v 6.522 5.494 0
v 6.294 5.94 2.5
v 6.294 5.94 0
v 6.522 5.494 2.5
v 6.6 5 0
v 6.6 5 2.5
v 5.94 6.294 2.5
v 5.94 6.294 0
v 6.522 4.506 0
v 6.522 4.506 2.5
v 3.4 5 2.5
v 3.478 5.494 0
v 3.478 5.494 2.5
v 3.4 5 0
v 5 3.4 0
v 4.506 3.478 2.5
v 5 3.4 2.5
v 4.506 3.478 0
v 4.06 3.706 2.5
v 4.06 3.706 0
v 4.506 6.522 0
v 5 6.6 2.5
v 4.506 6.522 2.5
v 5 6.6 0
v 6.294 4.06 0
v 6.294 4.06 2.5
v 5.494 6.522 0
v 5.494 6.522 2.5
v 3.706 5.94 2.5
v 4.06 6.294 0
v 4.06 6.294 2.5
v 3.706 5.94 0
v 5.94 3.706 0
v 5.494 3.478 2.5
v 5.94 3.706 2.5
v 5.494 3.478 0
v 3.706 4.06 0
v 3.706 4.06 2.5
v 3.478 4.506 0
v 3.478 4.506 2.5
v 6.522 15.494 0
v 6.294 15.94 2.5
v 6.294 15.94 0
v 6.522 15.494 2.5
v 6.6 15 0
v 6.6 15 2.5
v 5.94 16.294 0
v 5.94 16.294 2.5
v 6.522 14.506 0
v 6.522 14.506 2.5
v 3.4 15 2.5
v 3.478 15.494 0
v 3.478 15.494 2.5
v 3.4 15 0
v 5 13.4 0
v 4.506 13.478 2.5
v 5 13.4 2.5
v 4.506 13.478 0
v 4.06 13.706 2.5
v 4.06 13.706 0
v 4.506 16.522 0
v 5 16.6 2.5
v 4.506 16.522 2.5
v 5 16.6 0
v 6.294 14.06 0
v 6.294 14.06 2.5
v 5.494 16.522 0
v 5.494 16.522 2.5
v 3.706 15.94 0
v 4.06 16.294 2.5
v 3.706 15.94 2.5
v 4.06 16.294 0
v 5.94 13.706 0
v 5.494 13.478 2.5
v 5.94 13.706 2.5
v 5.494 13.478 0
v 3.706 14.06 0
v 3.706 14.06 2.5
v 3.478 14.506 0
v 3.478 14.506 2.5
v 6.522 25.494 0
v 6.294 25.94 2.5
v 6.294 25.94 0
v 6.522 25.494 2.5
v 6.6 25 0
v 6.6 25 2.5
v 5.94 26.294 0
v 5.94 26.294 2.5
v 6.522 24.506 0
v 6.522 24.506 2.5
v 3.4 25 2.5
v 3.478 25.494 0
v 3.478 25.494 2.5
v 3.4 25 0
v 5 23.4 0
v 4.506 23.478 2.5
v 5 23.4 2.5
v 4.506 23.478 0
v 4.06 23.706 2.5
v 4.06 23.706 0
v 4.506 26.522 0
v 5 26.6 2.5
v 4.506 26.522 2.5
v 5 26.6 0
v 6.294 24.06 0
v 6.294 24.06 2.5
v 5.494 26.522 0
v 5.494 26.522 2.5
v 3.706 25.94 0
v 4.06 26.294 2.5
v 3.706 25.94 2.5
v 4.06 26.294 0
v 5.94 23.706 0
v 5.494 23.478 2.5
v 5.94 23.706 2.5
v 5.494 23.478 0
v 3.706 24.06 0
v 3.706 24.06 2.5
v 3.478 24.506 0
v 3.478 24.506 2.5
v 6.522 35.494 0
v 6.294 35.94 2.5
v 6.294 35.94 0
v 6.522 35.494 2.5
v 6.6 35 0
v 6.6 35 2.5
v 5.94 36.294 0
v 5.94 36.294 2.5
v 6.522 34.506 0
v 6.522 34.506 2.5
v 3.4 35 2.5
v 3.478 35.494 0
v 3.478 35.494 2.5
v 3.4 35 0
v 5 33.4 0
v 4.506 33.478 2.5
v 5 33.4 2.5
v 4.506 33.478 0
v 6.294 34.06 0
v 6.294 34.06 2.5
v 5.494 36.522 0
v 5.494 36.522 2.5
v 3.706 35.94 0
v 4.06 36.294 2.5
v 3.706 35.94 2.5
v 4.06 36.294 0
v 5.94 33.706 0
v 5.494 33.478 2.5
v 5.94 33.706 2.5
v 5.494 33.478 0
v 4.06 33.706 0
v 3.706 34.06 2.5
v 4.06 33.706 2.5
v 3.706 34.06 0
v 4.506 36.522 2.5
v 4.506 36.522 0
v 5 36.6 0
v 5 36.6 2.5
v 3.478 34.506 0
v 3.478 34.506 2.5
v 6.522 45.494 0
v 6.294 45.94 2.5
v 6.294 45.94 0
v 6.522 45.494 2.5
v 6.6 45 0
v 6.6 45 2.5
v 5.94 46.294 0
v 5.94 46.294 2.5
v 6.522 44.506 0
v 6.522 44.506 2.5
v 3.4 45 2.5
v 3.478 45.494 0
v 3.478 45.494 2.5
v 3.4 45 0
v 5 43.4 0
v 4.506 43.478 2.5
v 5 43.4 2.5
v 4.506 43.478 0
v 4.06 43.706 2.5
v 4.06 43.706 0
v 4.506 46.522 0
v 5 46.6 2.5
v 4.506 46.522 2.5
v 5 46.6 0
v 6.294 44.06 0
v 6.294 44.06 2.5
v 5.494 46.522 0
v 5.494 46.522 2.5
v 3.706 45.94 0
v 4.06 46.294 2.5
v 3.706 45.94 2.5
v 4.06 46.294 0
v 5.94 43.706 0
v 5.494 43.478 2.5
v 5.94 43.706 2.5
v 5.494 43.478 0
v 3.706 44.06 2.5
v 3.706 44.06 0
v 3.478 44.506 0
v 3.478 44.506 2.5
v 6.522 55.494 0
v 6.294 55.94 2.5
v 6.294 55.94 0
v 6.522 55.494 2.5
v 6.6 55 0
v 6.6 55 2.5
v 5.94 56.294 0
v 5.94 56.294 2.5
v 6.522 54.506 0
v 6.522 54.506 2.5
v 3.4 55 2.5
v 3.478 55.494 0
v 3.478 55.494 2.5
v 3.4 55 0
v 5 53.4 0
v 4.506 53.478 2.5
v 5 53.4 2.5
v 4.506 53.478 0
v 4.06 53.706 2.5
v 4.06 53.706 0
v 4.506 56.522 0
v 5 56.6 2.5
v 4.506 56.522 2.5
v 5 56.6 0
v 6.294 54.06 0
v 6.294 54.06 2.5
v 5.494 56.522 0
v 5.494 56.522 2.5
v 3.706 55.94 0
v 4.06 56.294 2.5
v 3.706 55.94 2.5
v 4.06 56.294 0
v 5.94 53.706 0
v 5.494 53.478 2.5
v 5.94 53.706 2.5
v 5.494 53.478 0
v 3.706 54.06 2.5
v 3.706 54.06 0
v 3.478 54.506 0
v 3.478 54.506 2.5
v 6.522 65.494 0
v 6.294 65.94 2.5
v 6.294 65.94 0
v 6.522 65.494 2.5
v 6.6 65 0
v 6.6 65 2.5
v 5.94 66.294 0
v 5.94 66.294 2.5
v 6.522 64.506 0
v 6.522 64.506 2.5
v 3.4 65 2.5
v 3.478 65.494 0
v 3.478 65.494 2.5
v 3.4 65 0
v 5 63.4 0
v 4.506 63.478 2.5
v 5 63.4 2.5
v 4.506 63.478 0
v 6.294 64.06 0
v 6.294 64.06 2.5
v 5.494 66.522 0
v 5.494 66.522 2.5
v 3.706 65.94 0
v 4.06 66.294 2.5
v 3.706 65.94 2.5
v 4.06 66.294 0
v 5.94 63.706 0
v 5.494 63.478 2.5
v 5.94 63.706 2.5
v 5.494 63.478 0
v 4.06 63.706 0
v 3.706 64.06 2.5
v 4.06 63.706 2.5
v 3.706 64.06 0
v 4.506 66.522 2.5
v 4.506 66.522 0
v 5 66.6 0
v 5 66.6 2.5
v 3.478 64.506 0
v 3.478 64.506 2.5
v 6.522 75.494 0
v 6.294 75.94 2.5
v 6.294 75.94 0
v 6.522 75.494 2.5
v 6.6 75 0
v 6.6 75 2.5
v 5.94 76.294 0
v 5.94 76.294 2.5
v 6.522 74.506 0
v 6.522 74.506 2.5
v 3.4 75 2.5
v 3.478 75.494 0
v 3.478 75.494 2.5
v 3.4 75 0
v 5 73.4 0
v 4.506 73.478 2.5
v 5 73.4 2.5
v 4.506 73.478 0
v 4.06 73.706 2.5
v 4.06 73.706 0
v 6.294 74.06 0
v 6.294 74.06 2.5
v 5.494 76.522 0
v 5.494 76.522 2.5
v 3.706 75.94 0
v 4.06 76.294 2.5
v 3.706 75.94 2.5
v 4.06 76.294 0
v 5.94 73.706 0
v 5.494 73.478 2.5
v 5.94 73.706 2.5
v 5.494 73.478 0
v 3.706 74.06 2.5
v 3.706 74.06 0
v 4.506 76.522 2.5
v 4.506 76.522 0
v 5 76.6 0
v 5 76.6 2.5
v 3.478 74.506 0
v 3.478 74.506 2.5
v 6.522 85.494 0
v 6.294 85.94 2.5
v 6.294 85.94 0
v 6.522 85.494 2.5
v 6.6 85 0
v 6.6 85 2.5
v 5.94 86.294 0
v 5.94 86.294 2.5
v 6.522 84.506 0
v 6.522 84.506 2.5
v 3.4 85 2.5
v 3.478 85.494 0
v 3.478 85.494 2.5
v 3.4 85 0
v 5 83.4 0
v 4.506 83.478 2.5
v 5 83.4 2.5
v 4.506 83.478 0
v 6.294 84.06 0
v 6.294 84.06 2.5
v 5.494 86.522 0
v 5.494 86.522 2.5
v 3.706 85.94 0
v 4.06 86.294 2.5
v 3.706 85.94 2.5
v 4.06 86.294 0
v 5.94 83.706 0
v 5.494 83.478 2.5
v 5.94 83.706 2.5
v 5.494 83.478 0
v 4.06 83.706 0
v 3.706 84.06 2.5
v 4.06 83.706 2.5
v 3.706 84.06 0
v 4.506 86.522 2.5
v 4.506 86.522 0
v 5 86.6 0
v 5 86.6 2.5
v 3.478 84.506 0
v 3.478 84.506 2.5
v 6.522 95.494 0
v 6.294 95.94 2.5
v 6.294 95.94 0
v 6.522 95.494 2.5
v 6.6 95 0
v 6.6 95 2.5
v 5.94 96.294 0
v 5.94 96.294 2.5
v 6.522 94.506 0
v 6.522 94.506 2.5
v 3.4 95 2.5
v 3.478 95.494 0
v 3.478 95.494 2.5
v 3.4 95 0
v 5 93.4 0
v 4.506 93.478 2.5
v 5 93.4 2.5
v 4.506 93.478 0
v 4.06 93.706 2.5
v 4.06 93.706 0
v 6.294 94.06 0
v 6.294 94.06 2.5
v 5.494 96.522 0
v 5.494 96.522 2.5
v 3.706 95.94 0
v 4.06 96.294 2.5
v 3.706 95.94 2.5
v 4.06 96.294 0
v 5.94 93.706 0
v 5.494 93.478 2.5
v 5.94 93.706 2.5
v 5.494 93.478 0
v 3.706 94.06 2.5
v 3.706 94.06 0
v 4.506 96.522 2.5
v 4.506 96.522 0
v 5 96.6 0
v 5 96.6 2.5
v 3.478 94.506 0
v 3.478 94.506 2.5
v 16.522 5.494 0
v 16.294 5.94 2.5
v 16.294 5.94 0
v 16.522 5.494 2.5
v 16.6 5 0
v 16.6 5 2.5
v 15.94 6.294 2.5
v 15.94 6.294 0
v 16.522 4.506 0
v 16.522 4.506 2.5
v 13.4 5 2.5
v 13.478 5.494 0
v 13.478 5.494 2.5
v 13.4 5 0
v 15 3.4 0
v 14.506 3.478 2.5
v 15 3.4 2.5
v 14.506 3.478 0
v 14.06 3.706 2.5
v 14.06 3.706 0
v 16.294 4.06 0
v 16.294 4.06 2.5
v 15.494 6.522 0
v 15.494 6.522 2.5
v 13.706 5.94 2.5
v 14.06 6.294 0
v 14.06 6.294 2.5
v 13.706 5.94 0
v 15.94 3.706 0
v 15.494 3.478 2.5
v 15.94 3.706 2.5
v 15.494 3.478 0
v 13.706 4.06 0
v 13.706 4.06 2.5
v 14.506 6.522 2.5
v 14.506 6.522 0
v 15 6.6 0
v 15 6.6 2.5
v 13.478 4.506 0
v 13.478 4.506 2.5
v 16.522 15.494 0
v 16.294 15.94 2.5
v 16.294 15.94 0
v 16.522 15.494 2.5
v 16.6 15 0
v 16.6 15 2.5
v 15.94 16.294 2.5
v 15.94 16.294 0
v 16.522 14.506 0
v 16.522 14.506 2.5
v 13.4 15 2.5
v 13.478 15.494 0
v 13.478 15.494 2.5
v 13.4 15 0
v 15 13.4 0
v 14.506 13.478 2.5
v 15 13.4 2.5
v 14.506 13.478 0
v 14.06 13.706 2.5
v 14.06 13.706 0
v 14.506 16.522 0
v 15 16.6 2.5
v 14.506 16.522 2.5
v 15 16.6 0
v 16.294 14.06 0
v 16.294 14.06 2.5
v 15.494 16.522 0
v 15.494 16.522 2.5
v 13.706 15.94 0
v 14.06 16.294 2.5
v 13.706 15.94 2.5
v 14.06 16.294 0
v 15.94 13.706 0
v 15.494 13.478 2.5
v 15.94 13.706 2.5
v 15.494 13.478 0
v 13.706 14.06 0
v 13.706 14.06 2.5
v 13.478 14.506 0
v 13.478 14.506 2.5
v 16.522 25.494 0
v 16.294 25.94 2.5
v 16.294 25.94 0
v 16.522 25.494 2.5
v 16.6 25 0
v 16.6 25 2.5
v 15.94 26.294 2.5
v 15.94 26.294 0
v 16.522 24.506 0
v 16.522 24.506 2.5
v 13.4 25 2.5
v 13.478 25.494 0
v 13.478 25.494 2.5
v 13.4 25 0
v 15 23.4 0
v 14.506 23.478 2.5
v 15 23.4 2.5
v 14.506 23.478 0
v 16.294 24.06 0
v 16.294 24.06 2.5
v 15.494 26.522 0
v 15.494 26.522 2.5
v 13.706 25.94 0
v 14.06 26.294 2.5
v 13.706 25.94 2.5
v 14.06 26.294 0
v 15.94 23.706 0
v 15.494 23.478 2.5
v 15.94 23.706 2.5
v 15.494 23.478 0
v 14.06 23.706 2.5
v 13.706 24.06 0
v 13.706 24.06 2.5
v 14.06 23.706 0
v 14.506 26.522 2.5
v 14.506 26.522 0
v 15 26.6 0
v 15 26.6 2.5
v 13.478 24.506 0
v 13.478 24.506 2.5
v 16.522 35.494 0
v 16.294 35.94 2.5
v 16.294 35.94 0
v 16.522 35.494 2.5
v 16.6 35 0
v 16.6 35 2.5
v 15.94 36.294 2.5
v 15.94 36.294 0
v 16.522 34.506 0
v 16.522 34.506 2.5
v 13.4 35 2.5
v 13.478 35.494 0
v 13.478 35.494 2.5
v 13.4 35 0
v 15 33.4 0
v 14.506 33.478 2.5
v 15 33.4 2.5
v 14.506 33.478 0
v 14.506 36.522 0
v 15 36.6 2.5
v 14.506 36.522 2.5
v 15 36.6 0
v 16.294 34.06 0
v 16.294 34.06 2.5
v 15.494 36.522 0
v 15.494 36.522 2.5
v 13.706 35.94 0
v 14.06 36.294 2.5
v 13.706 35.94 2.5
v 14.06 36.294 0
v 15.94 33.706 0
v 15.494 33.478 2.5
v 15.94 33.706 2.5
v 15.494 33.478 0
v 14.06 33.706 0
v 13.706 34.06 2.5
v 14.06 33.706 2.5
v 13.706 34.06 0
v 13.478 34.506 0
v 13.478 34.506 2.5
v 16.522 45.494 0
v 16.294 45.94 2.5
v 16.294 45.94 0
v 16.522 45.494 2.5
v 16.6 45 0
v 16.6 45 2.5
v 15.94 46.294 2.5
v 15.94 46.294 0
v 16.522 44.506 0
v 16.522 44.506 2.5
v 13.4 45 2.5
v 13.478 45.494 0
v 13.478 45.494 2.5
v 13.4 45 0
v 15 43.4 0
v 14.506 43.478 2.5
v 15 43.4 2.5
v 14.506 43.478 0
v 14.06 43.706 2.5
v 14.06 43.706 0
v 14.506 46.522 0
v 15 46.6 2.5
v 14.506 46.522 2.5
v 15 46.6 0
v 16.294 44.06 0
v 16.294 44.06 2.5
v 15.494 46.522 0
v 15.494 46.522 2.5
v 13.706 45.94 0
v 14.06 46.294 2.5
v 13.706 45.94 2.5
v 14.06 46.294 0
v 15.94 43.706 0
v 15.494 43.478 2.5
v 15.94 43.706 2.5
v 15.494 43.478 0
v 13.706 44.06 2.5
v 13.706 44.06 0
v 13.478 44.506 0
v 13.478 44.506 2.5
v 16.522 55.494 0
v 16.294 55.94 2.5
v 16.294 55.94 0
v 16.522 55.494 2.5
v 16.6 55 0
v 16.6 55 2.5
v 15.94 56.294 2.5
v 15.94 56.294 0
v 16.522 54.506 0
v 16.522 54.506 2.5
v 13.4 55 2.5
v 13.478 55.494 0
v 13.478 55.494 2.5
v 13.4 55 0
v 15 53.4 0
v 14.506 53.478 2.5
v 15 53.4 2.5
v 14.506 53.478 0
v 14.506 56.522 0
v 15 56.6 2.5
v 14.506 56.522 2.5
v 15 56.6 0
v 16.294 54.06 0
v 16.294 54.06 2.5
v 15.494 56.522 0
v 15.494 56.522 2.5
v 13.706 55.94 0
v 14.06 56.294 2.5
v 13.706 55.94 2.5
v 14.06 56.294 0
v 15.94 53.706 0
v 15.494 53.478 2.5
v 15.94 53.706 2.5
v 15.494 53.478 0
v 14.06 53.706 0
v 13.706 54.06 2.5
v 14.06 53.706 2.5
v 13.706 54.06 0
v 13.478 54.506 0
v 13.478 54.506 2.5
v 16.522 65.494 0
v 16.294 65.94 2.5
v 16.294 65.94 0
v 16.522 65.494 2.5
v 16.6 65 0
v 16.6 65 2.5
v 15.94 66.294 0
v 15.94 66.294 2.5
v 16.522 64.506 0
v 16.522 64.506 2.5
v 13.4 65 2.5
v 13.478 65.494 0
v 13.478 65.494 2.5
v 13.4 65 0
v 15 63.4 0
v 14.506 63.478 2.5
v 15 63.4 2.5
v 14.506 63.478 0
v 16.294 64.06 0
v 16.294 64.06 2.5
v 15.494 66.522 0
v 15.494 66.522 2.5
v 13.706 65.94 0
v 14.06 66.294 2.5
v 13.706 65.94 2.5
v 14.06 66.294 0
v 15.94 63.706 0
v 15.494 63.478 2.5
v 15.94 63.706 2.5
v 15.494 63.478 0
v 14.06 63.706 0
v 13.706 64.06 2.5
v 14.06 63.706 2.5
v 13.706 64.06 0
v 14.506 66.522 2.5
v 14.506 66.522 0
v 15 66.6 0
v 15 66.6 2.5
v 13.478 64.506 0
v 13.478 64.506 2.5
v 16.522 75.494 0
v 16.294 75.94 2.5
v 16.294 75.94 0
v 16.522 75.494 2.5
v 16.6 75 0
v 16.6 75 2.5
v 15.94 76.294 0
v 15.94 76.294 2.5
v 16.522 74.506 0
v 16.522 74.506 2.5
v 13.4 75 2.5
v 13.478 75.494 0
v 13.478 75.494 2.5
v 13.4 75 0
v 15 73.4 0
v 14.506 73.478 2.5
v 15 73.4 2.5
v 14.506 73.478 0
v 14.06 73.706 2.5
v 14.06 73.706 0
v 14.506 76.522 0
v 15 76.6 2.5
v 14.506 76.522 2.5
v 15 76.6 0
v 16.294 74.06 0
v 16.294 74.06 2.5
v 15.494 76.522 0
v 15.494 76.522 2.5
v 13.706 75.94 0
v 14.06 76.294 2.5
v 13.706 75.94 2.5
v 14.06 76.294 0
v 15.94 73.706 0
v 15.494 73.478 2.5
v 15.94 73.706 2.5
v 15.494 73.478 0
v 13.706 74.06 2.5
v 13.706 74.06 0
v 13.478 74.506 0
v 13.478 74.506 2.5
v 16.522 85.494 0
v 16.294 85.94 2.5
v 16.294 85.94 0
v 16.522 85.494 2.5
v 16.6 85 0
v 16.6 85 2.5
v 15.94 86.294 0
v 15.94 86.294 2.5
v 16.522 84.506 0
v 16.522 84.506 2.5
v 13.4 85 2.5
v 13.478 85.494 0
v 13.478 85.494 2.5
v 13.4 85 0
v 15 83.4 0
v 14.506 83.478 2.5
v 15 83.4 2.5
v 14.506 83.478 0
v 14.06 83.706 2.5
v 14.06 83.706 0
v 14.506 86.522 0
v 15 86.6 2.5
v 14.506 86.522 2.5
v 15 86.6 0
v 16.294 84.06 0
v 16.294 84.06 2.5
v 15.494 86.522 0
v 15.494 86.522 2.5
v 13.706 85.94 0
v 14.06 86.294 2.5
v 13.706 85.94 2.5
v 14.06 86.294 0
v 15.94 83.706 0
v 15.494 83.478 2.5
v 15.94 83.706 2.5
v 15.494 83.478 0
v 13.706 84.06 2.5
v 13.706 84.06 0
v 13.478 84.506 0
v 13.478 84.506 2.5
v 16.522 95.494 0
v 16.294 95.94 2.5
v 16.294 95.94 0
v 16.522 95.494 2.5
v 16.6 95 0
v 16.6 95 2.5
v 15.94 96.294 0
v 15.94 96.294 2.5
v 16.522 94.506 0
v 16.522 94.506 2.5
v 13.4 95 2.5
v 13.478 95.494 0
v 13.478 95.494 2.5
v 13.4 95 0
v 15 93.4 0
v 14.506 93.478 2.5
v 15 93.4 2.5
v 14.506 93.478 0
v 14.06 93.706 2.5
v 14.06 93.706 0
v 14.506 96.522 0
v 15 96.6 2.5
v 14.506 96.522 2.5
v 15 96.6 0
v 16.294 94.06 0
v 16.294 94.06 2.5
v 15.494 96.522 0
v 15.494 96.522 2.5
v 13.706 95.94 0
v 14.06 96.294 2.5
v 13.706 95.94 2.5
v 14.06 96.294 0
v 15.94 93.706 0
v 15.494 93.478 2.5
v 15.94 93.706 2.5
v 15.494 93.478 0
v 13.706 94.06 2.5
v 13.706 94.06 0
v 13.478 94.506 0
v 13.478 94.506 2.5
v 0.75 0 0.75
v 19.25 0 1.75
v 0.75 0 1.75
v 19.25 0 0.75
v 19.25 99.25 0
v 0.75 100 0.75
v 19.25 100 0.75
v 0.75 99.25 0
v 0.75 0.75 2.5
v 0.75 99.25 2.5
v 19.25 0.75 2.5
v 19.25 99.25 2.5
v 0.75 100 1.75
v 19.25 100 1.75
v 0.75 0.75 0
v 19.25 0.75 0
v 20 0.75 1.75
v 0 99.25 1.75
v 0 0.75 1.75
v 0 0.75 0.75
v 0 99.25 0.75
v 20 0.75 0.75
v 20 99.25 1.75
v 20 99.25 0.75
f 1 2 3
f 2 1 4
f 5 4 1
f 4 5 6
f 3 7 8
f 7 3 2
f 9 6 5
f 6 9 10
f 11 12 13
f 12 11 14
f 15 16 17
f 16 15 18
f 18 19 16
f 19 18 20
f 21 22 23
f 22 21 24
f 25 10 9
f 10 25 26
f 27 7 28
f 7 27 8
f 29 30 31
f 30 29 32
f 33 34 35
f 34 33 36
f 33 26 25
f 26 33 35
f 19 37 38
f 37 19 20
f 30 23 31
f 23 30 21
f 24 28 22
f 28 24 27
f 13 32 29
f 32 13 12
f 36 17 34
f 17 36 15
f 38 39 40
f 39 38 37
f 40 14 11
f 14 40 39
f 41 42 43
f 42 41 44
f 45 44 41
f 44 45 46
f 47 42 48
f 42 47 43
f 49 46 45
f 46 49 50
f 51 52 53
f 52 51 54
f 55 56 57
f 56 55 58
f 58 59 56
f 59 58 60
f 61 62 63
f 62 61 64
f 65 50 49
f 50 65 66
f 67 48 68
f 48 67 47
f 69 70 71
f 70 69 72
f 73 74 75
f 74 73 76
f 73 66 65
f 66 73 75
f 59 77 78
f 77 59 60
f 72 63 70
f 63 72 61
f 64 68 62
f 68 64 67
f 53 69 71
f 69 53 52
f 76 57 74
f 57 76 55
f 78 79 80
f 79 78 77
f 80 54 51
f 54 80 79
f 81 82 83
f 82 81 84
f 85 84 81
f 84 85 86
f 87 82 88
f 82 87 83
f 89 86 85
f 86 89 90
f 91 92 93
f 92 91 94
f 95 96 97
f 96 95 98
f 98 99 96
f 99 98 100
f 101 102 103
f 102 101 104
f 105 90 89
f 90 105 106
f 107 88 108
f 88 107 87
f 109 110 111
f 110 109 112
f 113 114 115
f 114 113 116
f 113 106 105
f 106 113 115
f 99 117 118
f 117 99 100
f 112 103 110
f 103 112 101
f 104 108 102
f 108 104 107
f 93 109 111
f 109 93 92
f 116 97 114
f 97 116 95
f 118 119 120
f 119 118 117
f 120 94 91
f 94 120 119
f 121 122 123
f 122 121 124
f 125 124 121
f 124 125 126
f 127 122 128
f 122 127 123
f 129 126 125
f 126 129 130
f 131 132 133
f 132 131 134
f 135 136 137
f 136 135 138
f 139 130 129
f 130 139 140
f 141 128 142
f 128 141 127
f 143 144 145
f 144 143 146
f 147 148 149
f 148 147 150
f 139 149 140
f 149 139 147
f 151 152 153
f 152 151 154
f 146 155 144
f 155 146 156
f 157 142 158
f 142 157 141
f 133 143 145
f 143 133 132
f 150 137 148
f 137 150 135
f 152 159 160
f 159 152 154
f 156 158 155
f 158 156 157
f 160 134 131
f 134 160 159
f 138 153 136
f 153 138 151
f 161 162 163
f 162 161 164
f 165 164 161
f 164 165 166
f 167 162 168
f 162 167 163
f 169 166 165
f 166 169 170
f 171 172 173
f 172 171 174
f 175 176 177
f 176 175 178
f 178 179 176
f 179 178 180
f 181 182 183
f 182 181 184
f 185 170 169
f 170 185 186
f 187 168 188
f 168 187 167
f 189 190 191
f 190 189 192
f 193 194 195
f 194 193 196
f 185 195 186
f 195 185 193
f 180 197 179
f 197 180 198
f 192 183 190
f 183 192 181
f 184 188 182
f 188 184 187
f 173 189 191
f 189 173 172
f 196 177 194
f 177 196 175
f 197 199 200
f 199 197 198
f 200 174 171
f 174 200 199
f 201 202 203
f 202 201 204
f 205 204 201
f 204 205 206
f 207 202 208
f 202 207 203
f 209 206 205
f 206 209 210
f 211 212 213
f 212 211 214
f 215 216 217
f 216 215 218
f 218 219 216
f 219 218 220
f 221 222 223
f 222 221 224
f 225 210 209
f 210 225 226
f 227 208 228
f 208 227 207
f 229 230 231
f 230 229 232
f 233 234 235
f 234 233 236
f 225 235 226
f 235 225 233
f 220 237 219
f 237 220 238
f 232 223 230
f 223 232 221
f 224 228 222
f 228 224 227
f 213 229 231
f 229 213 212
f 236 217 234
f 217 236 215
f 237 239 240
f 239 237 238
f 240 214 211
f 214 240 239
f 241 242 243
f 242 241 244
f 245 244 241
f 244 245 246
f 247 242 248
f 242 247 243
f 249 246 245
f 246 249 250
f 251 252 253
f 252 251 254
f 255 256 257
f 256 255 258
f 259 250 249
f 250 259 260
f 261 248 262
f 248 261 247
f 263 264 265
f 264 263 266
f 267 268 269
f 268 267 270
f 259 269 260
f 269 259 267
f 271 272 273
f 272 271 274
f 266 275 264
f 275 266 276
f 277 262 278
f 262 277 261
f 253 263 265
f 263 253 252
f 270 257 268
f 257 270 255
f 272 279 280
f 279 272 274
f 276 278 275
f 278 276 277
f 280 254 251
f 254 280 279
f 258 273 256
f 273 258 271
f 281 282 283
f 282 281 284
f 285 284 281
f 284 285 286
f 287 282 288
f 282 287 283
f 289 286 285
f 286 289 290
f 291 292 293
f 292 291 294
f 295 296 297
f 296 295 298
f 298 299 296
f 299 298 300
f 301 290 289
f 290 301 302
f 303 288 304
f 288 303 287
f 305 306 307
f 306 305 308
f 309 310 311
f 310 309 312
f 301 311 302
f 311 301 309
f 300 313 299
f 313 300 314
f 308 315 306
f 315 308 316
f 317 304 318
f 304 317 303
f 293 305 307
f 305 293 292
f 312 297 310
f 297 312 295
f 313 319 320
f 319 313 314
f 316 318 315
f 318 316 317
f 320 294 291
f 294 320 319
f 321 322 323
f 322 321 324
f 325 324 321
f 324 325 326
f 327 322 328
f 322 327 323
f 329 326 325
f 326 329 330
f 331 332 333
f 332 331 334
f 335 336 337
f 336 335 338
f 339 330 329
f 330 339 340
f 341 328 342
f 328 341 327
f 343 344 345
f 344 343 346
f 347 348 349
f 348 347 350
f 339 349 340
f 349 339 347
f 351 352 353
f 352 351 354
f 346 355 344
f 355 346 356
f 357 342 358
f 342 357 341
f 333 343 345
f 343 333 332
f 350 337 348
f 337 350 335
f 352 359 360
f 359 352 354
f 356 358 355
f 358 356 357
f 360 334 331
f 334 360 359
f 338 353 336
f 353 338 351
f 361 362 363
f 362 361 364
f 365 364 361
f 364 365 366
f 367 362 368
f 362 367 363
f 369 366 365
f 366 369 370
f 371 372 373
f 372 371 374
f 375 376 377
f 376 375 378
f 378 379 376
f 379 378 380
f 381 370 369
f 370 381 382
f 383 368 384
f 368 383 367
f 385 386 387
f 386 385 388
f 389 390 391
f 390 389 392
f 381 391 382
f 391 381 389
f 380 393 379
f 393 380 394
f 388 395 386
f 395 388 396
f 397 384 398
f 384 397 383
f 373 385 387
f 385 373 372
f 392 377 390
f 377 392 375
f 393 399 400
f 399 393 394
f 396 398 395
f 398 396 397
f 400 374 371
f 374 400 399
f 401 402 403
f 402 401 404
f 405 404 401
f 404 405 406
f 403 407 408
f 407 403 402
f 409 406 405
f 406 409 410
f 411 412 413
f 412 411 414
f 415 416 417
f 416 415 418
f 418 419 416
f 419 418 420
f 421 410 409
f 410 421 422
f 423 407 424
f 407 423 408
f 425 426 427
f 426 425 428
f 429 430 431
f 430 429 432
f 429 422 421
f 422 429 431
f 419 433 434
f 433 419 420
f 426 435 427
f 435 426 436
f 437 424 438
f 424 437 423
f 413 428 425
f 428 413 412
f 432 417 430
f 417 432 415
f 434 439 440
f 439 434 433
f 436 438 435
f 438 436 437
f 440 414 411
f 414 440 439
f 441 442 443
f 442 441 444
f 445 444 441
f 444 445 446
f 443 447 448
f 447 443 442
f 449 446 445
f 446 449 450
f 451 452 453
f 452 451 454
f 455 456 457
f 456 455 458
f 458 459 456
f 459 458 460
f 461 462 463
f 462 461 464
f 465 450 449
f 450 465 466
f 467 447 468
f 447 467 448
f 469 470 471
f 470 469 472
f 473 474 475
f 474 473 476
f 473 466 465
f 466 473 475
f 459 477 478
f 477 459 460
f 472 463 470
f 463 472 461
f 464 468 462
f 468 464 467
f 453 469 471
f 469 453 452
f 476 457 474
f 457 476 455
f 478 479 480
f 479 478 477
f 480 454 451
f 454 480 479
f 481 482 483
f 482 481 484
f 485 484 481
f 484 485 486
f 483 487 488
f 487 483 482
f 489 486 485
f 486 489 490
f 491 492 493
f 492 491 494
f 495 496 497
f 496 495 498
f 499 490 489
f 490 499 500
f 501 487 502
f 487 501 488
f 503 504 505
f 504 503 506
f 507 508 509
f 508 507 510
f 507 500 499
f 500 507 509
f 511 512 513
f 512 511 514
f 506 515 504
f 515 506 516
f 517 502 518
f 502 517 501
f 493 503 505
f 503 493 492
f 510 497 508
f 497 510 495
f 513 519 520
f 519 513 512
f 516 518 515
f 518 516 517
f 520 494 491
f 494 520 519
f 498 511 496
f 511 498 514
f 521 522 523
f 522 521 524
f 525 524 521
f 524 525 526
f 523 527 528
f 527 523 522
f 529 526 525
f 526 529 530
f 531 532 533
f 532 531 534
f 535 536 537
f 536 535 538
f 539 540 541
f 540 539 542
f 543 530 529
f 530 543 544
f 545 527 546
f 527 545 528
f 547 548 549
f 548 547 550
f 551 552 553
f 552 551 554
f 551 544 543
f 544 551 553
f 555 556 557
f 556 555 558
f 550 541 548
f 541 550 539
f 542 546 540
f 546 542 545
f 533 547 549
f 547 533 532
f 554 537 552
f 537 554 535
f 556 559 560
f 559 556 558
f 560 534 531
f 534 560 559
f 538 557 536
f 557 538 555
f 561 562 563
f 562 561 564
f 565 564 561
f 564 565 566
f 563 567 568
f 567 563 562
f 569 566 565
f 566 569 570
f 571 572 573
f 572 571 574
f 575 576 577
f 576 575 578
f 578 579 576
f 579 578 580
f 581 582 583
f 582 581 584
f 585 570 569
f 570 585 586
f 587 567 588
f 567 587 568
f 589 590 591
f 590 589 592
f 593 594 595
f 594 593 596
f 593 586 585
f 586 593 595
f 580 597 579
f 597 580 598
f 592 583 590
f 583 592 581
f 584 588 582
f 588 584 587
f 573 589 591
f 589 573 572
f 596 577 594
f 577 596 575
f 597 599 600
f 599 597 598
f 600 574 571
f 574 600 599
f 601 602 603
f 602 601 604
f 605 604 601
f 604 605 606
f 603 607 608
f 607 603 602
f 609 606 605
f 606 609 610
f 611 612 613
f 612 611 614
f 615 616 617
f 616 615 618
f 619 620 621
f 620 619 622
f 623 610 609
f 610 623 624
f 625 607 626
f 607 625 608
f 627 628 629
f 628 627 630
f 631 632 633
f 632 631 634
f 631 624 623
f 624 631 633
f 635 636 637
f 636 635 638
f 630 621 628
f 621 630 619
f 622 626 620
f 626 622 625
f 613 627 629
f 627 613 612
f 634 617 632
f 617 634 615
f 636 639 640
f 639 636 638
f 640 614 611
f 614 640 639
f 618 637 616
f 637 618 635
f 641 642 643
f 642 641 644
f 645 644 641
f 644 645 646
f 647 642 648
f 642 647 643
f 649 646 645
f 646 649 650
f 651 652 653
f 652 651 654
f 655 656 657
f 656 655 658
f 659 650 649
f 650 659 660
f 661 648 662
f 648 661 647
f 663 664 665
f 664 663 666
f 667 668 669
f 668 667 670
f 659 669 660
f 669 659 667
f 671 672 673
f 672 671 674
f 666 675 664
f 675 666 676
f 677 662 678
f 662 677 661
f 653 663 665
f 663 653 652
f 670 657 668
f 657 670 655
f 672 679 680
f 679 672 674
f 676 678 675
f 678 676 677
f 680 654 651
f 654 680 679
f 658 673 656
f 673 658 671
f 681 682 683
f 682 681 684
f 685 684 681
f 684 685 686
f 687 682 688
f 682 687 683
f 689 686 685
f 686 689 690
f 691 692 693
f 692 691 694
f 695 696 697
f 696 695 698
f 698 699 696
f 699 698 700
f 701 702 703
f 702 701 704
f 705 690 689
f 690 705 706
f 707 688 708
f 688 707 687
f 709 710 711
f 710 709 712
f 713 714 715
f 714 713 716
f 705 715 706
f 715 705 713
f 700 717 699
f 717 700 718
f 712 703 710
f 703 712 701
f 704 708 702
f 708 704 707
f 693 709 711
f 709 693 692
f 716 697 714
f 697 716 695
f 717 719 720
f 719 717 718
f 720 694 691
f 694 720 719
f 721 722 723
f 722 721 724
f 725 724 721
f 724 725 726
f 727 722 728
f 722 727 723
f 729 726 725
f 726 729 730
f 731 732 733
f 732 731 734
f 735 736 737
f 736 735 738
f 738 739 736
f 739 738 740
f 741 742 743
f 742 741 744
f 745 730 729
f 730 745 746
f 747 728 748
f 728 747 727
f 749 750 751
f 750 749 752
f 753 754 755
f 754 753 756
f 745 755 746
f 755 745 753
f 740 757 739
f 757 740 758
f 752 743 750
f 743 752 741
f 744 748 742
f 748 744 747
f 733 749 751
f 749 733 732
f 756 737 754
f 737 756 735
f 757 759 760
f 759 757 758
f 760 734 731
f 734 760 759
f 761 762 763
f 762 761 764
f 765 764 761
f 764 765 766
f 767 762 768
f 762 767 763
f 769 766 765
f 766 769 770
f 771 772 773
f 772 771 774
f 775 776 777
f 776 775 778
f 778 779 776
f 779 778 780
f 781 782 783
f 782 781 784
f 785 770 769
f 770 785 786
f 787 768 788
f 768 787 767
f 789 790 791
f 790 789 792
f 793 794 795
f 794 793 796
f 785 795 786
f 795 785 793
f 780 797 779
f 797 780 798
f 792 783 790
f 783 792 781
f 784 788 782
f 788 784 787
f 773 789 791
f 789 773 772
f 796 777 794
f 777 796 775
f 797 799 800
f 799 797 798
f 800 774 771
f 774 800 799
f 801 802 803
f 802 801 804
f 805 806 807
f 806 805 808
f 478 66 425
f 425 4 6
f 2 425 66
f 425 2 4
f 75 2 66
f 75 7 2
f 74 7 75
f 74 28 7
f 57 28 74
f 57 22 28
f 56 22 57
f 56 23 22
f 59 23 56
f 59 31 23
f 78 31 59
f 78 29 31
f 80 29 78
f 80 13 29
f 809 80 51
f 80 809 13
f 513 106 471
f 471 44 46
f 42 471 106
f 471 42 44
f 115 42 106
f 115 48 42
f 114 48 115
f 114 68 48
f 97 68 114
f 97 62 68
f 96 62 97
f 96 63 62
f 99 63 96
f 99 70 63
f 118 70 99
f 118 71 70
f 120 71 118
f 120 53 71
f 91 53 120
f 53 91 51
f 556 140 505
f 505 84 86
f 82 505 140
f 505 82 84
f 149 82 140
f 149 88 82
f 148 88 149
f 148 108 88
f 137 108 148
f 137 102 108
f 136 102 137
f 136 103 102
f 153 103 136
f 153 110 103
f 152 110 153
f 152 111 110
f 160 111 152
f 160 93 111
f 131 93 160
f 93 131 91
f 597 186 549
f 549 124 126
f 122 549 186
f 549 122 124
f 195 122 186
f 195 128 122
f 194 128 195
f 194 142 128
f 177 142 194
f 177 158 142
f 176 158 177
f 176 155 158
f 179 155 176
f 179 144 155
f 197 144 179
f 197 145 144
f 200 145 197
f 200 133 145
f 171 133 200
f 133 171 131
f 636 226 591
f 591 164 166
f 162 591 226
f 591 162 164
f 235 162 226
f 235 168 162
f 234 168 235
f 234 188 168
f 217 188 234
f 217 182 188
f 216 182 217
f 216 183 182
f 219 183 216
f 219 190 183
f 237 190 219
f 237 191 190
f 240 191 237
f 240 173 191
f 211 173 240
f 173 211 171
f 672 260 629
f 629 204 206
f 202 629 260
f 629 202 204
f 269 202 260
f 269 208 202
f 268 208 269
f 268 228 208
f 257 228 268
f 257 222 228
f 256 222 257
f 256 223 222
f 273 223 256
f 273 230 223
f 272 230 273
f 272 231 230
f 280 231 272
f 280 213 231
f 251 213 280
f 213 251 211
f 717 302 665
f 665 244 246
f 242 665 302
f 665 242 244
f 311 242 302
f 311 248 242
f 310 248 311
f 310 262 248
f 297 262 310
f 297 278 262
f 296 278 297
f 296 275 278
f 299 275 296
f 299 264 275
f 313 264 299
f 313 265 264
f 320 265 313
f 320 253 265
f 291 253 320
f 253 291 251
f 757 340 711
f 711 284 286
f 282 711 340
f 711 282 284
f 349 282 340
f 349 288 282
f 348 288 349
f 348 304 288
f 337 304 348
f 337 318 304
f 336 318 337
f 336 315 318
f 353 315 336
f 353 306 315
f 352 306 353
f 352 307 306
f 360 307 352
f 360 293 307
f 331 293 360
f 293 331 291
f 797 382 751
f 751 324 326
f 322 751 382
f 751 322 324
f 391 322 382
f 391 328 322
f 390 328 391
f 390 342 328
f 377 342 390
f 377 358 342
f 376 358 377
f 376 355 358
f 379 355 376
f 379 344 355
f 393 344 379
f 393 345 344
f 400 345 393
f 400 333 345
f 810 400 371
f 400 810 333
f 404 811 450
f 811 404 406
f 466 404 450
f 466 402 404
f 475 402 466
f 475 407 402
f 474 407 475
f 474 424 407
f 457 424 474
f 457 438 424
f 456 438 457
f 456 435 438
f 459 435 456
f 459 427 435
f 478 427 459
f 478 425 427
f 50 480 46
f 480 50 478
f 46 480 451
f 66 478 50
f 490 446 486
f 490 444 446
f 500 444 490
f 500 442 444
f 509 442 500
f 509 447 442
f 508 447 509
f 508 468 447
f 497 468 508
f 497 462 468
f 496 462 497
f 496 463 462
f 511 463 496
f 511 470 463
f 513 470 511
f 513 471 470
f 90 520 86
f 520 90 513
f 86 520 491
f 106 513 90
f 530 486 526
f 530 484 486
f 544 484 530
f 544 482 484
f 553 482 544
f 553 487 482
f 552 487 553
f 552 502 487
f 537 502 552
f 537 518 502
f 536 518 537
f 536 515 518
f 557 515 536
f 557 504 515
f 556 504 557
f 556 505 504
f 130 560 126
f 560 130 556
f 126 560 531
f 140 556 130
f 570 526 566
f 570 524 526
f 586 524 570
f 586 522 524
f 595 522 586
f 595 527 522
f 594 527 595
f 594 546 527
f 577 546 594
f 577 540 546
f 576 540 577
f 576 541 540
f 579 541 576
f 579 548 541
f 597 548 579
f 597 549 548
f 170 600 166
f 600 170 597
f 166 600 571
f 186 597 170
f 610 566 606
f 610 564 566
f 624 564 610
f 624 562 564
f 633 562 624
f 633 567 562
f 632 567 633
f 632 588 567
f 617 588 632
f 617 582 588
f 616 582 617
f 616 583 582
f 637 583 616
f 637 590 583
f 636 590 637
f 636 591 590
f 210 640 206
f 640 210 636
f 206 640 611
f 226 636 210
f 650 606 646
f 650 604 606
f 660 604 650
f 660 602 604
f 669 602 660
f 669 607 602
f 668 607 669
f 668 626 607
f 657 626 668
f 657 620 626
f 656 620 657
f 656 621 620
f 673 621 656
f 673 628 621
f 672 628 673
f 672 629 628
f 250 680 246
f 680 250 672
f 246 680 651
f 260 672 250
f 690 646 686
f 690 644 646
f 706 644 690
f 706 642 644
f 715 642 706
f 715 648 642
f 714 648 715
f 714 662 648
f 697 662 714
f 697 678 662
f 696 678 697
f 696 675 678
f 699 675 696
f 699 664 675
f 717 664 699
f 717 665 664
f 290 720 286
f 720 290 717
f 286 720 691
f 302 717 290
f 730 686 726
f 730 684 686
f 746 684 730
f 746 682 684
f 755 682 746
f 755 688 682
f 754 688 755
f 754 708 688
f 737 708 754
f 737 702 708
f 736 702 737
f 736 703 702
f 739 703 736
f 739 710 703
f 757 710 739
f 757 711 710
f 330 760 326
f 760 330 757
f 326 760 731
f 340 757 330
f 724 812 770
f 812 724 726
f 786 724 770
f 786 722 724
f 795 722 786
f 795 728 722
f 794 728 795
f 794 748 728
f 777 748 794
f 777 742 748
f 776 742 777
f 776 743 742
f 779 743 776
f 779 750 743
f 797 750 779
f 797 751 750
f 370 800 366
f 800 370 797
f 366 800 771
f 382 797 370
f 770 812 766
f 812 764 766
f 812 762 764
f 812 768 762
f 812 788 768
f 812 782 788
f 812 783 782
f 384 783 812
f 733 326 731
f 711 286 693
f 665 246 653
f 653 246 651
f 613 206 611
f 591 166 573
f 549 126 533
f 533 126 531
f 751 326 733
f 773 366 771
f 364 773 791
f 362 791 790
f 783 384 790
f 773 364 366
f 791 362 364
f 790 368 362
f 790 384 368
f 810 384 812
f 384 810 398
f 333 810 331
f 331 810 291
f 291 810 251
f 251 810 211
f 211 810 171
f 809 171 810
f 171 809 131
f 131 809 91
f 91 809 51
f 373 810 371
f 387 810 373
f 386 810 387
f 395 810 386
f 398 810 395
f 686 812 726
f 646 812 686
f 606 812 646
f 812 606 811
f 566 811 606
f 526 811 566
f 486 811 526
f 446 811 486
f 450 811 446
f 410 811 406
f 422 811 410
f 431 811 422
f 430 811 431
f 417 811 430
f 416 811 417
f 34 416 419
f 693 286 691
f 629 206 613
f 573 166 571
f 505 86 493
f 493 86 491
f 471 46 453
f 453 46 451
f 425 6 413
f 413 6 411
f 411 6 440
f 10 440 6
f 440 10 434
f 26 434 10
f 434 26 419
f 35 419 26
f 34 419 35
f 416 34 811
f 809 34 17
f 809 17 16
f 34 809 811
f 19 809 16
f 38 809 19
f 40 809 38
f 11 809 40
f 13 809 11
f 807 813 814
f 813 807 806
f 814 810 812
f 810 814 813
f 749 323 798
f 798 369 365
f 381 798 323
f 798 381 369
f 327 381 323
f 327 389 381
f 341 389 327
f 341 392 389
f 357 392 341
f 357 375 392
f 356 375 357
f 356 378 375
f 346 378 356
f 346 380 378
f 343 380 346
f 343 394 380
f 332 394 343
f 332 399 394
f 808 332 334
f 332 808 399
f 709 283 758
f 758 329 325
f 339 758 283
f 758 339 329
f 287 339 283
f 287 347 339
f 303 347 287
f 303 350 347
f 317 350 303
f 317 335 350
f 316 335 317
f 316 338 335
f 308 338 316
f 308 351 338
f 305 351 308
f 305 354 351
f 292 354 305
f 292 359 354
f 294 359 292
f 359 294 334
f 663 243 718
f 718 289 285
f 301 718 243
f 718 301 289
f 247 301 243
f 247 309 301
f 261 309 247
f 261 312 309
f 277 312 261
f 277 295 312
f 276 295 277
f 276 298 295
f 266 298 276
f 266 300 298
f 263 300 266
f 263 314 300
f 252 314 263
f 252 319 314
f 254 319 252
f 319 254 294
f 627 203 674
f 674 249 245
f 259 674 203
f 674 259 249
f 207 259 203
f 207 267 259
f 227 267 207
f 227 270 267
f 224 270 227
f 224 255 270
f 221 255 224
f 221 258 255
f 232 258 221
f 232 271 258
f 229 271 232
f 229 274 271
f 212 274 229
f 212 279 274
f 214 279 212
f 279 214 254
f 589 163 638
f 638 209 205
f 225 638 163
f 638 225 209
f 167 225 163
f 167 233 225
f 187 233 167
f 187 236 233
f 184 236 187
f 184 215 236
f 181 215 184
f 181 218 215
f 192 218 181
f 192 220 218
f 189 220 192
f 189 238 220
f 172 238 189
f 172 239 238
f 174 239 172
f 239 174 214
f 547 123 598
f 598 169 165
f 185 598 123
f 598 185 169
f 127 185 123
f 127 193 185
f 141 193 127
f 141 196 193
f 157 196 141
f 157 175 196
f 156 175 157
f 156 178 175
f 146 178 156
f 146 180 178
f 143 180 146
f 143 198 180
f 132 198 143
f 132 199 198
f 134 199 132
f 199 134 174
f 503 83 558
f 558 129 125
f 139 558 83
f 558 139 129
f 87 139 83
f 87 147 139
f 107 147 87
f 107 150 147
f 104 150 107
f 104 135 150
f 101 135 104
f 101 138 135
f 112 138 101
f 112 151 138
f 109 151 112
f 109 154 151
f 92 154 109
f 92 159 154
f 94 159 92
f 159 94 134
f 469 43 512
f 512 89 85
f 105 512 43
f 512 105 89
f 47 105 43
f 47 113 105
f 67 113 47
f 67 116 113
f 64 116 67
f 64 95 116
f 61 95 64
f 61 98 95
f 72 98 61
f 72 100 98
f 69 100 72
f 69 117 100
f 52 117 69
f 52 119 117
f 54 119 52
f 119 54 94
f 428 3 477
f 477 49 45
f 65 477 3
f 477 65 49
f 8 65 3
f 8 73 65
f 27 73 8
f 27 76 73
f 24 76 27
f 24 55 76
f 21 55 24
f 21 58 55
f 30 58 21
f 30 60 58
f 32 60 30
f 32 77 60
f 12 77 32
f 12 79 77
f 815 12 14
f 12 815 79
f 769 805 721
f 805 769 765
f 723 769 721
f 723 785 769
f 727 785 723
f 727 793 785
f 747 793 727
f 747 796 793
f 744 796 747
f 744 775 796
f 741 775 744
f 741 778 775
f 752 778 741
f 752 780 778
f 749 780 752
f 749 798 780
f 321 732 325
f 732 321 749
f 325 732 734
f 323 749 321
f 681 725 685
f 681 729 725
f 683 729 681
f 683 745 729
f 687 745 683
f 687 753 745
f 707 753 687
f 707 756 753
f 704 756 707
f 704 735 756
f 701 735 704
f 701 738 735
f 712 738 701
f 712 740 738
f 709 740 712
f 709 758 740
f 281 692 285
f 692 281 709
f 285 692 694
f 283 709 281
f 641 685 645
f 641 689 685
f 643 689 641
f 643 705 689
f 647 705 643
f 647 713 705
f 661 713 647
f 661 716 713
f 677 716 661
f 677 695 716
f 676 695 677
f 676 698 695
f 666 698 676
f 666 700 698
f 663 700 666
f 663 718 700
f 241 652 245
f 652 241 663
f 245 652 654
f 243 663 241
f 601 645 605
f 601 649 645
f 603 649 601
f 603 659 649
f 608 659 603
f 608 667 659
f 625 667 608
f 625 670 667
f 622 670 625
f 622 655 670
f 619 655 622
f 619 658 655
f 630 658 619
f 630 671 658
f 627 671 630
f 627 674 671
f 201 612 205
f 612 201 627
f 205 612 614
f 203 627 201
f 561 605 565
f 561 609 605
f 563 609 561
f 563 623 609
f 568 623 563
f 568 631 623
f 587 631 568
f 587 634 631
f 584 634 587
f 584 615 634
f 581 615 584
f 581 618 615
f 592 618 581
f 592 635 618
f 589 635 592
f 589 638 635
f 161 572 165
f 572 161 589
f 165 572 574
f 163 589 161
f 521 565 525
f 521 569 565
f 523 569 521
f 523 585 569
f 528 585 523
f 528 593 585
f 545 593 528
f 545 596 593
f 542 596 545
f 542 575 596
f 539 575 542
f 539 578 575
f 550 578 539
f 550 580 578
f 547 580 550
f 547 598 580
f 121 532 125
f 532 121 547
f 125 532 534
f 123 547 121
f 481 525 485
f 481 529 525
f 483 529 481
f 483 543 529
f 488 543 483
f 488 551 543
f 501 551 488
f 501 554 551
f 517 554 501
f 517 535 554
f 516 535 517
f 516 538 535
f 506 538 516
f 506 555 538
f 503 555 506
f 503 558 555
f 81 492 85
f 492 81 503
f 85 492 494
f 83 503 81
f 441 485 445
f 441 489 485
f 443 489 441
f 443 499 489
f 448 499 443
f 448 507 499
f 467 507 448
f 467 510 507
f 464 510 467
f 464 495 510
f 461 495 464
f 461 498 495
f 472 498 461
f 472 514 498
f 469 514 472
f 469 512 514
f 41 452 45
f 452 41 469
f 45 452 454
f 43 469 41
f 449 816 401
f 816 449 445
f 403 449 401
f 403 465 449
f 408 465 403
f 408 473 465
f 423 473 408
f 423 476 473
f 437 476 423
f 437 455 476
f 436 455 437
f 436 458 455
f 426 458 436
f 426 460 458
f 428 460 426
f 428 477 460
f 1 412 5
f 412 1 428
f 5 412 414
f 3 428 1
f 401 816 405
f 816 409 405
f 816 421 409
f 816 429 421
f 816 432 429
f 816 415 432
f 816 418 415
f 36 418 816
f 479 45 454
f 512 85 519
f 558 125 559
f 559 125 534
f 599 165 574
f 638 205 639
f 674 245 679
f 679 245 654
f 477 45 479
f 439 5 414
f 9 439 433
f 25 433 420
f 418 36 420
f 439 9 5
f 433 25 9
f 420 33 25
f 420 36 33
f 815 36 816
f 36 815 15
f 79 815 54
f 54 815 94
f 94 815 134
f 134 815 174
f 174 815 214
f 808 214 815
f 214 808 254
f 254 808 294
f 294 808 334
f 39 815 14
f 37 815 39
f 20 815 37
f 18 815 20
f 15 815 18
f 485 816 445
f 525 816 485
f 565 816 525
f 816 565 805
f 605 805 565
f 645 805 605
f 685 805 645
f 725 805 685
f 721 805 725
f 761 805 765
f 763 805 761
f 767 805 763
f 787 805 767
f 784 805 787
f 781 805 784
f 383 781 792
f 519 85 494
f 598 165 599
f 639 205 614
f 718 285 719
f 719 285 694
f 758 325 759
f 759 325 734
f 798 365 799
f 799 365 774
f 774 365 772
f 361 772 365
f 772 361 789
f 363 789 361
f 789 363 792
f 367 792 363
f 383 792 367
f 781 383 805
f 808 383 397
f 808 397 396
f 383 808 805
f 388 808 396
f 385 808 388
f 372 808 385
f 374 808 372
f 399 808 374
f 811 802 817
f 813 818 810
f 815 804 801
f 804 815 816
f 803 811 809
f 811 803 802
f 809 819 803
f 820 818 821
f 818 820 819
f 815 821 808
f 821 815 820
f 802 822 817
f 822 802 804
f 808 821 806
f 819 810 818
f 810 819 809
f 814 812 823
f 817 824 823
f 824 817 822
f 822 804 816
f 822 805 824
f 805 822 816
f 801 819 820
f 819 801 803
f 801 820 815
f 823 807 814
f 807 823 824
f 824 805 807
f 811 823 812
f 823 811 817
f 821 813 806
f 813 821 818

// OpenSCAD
/*  
        Plate.scad
        M3Z core library 1.0.0
*/

//BEGIN OPTIONS - edit these parameters to generate custom parts of this form.

N = 2; //whole number of 10mm units along the X axis
M = 10; //whole number of 10mm units along the Y axis

THICKNESS = 2.5; //Nominal 2.5mm - thickness of the walls of the part

CHAMFER_DEPTH = 0.75; //Default 0.75mm

HOLE_DIAMETER = 3.2; //Nominal 3.0mm - common diameter of holes throughout

HOLE_FACES = 15; //Default 20 - higher number => slower render, smoother holes

//END OPTIONS - edit all else at your own risk

//Modules

module chamferCube(dimensions,depth){
    //where dimensions is a vector e.g. [10,20,30] and depth is the depth of the chamfer.
    
    f=2*depth;
    
    octaPoints = [ 
                    [1,0,0],
                    [0,1,0],
                    [-1,0,0],
                    [0,-1,0],
                    [0,0,1],
                    [0,0,-1]
                ];

    octaFaces = [   
                    [0,4,1],
                    [1,4,2],
                    [2,4,3],
                    [3,4,0],
                    [0,1,5],
                    [1,2,5],
                    [2,3,5],
                    [3,0,5] 
                ];
    translate([depth,depth,depth])
    minkowski(){
        cube([dimensions[0]-f,dimensions[1]-f,dimensions[2]-f]);
        polyhedron(octaPoints*depth, octaFaces);
    }
}

//variables (derived and not to be edited)

bodyWidth = N * 10;
bodyLength = M * 10;
bodyHeight = THICKNESS;
bodyDims = [bodyWidth,bodyLength,bodyHeight];

//Part Generating Code
difference(){
    chamferCube(bodyDims,CHAMFER_DEPTH);
    for(i = [0:N-1]){
        for(j = [0:M-1]){
            translate([5+(10*i),5+(10*j),0]){
                cylinder(h = 10, d = HOLE_DIAMETER, center = true, $fn = 20);
            }
        }
    }
}
